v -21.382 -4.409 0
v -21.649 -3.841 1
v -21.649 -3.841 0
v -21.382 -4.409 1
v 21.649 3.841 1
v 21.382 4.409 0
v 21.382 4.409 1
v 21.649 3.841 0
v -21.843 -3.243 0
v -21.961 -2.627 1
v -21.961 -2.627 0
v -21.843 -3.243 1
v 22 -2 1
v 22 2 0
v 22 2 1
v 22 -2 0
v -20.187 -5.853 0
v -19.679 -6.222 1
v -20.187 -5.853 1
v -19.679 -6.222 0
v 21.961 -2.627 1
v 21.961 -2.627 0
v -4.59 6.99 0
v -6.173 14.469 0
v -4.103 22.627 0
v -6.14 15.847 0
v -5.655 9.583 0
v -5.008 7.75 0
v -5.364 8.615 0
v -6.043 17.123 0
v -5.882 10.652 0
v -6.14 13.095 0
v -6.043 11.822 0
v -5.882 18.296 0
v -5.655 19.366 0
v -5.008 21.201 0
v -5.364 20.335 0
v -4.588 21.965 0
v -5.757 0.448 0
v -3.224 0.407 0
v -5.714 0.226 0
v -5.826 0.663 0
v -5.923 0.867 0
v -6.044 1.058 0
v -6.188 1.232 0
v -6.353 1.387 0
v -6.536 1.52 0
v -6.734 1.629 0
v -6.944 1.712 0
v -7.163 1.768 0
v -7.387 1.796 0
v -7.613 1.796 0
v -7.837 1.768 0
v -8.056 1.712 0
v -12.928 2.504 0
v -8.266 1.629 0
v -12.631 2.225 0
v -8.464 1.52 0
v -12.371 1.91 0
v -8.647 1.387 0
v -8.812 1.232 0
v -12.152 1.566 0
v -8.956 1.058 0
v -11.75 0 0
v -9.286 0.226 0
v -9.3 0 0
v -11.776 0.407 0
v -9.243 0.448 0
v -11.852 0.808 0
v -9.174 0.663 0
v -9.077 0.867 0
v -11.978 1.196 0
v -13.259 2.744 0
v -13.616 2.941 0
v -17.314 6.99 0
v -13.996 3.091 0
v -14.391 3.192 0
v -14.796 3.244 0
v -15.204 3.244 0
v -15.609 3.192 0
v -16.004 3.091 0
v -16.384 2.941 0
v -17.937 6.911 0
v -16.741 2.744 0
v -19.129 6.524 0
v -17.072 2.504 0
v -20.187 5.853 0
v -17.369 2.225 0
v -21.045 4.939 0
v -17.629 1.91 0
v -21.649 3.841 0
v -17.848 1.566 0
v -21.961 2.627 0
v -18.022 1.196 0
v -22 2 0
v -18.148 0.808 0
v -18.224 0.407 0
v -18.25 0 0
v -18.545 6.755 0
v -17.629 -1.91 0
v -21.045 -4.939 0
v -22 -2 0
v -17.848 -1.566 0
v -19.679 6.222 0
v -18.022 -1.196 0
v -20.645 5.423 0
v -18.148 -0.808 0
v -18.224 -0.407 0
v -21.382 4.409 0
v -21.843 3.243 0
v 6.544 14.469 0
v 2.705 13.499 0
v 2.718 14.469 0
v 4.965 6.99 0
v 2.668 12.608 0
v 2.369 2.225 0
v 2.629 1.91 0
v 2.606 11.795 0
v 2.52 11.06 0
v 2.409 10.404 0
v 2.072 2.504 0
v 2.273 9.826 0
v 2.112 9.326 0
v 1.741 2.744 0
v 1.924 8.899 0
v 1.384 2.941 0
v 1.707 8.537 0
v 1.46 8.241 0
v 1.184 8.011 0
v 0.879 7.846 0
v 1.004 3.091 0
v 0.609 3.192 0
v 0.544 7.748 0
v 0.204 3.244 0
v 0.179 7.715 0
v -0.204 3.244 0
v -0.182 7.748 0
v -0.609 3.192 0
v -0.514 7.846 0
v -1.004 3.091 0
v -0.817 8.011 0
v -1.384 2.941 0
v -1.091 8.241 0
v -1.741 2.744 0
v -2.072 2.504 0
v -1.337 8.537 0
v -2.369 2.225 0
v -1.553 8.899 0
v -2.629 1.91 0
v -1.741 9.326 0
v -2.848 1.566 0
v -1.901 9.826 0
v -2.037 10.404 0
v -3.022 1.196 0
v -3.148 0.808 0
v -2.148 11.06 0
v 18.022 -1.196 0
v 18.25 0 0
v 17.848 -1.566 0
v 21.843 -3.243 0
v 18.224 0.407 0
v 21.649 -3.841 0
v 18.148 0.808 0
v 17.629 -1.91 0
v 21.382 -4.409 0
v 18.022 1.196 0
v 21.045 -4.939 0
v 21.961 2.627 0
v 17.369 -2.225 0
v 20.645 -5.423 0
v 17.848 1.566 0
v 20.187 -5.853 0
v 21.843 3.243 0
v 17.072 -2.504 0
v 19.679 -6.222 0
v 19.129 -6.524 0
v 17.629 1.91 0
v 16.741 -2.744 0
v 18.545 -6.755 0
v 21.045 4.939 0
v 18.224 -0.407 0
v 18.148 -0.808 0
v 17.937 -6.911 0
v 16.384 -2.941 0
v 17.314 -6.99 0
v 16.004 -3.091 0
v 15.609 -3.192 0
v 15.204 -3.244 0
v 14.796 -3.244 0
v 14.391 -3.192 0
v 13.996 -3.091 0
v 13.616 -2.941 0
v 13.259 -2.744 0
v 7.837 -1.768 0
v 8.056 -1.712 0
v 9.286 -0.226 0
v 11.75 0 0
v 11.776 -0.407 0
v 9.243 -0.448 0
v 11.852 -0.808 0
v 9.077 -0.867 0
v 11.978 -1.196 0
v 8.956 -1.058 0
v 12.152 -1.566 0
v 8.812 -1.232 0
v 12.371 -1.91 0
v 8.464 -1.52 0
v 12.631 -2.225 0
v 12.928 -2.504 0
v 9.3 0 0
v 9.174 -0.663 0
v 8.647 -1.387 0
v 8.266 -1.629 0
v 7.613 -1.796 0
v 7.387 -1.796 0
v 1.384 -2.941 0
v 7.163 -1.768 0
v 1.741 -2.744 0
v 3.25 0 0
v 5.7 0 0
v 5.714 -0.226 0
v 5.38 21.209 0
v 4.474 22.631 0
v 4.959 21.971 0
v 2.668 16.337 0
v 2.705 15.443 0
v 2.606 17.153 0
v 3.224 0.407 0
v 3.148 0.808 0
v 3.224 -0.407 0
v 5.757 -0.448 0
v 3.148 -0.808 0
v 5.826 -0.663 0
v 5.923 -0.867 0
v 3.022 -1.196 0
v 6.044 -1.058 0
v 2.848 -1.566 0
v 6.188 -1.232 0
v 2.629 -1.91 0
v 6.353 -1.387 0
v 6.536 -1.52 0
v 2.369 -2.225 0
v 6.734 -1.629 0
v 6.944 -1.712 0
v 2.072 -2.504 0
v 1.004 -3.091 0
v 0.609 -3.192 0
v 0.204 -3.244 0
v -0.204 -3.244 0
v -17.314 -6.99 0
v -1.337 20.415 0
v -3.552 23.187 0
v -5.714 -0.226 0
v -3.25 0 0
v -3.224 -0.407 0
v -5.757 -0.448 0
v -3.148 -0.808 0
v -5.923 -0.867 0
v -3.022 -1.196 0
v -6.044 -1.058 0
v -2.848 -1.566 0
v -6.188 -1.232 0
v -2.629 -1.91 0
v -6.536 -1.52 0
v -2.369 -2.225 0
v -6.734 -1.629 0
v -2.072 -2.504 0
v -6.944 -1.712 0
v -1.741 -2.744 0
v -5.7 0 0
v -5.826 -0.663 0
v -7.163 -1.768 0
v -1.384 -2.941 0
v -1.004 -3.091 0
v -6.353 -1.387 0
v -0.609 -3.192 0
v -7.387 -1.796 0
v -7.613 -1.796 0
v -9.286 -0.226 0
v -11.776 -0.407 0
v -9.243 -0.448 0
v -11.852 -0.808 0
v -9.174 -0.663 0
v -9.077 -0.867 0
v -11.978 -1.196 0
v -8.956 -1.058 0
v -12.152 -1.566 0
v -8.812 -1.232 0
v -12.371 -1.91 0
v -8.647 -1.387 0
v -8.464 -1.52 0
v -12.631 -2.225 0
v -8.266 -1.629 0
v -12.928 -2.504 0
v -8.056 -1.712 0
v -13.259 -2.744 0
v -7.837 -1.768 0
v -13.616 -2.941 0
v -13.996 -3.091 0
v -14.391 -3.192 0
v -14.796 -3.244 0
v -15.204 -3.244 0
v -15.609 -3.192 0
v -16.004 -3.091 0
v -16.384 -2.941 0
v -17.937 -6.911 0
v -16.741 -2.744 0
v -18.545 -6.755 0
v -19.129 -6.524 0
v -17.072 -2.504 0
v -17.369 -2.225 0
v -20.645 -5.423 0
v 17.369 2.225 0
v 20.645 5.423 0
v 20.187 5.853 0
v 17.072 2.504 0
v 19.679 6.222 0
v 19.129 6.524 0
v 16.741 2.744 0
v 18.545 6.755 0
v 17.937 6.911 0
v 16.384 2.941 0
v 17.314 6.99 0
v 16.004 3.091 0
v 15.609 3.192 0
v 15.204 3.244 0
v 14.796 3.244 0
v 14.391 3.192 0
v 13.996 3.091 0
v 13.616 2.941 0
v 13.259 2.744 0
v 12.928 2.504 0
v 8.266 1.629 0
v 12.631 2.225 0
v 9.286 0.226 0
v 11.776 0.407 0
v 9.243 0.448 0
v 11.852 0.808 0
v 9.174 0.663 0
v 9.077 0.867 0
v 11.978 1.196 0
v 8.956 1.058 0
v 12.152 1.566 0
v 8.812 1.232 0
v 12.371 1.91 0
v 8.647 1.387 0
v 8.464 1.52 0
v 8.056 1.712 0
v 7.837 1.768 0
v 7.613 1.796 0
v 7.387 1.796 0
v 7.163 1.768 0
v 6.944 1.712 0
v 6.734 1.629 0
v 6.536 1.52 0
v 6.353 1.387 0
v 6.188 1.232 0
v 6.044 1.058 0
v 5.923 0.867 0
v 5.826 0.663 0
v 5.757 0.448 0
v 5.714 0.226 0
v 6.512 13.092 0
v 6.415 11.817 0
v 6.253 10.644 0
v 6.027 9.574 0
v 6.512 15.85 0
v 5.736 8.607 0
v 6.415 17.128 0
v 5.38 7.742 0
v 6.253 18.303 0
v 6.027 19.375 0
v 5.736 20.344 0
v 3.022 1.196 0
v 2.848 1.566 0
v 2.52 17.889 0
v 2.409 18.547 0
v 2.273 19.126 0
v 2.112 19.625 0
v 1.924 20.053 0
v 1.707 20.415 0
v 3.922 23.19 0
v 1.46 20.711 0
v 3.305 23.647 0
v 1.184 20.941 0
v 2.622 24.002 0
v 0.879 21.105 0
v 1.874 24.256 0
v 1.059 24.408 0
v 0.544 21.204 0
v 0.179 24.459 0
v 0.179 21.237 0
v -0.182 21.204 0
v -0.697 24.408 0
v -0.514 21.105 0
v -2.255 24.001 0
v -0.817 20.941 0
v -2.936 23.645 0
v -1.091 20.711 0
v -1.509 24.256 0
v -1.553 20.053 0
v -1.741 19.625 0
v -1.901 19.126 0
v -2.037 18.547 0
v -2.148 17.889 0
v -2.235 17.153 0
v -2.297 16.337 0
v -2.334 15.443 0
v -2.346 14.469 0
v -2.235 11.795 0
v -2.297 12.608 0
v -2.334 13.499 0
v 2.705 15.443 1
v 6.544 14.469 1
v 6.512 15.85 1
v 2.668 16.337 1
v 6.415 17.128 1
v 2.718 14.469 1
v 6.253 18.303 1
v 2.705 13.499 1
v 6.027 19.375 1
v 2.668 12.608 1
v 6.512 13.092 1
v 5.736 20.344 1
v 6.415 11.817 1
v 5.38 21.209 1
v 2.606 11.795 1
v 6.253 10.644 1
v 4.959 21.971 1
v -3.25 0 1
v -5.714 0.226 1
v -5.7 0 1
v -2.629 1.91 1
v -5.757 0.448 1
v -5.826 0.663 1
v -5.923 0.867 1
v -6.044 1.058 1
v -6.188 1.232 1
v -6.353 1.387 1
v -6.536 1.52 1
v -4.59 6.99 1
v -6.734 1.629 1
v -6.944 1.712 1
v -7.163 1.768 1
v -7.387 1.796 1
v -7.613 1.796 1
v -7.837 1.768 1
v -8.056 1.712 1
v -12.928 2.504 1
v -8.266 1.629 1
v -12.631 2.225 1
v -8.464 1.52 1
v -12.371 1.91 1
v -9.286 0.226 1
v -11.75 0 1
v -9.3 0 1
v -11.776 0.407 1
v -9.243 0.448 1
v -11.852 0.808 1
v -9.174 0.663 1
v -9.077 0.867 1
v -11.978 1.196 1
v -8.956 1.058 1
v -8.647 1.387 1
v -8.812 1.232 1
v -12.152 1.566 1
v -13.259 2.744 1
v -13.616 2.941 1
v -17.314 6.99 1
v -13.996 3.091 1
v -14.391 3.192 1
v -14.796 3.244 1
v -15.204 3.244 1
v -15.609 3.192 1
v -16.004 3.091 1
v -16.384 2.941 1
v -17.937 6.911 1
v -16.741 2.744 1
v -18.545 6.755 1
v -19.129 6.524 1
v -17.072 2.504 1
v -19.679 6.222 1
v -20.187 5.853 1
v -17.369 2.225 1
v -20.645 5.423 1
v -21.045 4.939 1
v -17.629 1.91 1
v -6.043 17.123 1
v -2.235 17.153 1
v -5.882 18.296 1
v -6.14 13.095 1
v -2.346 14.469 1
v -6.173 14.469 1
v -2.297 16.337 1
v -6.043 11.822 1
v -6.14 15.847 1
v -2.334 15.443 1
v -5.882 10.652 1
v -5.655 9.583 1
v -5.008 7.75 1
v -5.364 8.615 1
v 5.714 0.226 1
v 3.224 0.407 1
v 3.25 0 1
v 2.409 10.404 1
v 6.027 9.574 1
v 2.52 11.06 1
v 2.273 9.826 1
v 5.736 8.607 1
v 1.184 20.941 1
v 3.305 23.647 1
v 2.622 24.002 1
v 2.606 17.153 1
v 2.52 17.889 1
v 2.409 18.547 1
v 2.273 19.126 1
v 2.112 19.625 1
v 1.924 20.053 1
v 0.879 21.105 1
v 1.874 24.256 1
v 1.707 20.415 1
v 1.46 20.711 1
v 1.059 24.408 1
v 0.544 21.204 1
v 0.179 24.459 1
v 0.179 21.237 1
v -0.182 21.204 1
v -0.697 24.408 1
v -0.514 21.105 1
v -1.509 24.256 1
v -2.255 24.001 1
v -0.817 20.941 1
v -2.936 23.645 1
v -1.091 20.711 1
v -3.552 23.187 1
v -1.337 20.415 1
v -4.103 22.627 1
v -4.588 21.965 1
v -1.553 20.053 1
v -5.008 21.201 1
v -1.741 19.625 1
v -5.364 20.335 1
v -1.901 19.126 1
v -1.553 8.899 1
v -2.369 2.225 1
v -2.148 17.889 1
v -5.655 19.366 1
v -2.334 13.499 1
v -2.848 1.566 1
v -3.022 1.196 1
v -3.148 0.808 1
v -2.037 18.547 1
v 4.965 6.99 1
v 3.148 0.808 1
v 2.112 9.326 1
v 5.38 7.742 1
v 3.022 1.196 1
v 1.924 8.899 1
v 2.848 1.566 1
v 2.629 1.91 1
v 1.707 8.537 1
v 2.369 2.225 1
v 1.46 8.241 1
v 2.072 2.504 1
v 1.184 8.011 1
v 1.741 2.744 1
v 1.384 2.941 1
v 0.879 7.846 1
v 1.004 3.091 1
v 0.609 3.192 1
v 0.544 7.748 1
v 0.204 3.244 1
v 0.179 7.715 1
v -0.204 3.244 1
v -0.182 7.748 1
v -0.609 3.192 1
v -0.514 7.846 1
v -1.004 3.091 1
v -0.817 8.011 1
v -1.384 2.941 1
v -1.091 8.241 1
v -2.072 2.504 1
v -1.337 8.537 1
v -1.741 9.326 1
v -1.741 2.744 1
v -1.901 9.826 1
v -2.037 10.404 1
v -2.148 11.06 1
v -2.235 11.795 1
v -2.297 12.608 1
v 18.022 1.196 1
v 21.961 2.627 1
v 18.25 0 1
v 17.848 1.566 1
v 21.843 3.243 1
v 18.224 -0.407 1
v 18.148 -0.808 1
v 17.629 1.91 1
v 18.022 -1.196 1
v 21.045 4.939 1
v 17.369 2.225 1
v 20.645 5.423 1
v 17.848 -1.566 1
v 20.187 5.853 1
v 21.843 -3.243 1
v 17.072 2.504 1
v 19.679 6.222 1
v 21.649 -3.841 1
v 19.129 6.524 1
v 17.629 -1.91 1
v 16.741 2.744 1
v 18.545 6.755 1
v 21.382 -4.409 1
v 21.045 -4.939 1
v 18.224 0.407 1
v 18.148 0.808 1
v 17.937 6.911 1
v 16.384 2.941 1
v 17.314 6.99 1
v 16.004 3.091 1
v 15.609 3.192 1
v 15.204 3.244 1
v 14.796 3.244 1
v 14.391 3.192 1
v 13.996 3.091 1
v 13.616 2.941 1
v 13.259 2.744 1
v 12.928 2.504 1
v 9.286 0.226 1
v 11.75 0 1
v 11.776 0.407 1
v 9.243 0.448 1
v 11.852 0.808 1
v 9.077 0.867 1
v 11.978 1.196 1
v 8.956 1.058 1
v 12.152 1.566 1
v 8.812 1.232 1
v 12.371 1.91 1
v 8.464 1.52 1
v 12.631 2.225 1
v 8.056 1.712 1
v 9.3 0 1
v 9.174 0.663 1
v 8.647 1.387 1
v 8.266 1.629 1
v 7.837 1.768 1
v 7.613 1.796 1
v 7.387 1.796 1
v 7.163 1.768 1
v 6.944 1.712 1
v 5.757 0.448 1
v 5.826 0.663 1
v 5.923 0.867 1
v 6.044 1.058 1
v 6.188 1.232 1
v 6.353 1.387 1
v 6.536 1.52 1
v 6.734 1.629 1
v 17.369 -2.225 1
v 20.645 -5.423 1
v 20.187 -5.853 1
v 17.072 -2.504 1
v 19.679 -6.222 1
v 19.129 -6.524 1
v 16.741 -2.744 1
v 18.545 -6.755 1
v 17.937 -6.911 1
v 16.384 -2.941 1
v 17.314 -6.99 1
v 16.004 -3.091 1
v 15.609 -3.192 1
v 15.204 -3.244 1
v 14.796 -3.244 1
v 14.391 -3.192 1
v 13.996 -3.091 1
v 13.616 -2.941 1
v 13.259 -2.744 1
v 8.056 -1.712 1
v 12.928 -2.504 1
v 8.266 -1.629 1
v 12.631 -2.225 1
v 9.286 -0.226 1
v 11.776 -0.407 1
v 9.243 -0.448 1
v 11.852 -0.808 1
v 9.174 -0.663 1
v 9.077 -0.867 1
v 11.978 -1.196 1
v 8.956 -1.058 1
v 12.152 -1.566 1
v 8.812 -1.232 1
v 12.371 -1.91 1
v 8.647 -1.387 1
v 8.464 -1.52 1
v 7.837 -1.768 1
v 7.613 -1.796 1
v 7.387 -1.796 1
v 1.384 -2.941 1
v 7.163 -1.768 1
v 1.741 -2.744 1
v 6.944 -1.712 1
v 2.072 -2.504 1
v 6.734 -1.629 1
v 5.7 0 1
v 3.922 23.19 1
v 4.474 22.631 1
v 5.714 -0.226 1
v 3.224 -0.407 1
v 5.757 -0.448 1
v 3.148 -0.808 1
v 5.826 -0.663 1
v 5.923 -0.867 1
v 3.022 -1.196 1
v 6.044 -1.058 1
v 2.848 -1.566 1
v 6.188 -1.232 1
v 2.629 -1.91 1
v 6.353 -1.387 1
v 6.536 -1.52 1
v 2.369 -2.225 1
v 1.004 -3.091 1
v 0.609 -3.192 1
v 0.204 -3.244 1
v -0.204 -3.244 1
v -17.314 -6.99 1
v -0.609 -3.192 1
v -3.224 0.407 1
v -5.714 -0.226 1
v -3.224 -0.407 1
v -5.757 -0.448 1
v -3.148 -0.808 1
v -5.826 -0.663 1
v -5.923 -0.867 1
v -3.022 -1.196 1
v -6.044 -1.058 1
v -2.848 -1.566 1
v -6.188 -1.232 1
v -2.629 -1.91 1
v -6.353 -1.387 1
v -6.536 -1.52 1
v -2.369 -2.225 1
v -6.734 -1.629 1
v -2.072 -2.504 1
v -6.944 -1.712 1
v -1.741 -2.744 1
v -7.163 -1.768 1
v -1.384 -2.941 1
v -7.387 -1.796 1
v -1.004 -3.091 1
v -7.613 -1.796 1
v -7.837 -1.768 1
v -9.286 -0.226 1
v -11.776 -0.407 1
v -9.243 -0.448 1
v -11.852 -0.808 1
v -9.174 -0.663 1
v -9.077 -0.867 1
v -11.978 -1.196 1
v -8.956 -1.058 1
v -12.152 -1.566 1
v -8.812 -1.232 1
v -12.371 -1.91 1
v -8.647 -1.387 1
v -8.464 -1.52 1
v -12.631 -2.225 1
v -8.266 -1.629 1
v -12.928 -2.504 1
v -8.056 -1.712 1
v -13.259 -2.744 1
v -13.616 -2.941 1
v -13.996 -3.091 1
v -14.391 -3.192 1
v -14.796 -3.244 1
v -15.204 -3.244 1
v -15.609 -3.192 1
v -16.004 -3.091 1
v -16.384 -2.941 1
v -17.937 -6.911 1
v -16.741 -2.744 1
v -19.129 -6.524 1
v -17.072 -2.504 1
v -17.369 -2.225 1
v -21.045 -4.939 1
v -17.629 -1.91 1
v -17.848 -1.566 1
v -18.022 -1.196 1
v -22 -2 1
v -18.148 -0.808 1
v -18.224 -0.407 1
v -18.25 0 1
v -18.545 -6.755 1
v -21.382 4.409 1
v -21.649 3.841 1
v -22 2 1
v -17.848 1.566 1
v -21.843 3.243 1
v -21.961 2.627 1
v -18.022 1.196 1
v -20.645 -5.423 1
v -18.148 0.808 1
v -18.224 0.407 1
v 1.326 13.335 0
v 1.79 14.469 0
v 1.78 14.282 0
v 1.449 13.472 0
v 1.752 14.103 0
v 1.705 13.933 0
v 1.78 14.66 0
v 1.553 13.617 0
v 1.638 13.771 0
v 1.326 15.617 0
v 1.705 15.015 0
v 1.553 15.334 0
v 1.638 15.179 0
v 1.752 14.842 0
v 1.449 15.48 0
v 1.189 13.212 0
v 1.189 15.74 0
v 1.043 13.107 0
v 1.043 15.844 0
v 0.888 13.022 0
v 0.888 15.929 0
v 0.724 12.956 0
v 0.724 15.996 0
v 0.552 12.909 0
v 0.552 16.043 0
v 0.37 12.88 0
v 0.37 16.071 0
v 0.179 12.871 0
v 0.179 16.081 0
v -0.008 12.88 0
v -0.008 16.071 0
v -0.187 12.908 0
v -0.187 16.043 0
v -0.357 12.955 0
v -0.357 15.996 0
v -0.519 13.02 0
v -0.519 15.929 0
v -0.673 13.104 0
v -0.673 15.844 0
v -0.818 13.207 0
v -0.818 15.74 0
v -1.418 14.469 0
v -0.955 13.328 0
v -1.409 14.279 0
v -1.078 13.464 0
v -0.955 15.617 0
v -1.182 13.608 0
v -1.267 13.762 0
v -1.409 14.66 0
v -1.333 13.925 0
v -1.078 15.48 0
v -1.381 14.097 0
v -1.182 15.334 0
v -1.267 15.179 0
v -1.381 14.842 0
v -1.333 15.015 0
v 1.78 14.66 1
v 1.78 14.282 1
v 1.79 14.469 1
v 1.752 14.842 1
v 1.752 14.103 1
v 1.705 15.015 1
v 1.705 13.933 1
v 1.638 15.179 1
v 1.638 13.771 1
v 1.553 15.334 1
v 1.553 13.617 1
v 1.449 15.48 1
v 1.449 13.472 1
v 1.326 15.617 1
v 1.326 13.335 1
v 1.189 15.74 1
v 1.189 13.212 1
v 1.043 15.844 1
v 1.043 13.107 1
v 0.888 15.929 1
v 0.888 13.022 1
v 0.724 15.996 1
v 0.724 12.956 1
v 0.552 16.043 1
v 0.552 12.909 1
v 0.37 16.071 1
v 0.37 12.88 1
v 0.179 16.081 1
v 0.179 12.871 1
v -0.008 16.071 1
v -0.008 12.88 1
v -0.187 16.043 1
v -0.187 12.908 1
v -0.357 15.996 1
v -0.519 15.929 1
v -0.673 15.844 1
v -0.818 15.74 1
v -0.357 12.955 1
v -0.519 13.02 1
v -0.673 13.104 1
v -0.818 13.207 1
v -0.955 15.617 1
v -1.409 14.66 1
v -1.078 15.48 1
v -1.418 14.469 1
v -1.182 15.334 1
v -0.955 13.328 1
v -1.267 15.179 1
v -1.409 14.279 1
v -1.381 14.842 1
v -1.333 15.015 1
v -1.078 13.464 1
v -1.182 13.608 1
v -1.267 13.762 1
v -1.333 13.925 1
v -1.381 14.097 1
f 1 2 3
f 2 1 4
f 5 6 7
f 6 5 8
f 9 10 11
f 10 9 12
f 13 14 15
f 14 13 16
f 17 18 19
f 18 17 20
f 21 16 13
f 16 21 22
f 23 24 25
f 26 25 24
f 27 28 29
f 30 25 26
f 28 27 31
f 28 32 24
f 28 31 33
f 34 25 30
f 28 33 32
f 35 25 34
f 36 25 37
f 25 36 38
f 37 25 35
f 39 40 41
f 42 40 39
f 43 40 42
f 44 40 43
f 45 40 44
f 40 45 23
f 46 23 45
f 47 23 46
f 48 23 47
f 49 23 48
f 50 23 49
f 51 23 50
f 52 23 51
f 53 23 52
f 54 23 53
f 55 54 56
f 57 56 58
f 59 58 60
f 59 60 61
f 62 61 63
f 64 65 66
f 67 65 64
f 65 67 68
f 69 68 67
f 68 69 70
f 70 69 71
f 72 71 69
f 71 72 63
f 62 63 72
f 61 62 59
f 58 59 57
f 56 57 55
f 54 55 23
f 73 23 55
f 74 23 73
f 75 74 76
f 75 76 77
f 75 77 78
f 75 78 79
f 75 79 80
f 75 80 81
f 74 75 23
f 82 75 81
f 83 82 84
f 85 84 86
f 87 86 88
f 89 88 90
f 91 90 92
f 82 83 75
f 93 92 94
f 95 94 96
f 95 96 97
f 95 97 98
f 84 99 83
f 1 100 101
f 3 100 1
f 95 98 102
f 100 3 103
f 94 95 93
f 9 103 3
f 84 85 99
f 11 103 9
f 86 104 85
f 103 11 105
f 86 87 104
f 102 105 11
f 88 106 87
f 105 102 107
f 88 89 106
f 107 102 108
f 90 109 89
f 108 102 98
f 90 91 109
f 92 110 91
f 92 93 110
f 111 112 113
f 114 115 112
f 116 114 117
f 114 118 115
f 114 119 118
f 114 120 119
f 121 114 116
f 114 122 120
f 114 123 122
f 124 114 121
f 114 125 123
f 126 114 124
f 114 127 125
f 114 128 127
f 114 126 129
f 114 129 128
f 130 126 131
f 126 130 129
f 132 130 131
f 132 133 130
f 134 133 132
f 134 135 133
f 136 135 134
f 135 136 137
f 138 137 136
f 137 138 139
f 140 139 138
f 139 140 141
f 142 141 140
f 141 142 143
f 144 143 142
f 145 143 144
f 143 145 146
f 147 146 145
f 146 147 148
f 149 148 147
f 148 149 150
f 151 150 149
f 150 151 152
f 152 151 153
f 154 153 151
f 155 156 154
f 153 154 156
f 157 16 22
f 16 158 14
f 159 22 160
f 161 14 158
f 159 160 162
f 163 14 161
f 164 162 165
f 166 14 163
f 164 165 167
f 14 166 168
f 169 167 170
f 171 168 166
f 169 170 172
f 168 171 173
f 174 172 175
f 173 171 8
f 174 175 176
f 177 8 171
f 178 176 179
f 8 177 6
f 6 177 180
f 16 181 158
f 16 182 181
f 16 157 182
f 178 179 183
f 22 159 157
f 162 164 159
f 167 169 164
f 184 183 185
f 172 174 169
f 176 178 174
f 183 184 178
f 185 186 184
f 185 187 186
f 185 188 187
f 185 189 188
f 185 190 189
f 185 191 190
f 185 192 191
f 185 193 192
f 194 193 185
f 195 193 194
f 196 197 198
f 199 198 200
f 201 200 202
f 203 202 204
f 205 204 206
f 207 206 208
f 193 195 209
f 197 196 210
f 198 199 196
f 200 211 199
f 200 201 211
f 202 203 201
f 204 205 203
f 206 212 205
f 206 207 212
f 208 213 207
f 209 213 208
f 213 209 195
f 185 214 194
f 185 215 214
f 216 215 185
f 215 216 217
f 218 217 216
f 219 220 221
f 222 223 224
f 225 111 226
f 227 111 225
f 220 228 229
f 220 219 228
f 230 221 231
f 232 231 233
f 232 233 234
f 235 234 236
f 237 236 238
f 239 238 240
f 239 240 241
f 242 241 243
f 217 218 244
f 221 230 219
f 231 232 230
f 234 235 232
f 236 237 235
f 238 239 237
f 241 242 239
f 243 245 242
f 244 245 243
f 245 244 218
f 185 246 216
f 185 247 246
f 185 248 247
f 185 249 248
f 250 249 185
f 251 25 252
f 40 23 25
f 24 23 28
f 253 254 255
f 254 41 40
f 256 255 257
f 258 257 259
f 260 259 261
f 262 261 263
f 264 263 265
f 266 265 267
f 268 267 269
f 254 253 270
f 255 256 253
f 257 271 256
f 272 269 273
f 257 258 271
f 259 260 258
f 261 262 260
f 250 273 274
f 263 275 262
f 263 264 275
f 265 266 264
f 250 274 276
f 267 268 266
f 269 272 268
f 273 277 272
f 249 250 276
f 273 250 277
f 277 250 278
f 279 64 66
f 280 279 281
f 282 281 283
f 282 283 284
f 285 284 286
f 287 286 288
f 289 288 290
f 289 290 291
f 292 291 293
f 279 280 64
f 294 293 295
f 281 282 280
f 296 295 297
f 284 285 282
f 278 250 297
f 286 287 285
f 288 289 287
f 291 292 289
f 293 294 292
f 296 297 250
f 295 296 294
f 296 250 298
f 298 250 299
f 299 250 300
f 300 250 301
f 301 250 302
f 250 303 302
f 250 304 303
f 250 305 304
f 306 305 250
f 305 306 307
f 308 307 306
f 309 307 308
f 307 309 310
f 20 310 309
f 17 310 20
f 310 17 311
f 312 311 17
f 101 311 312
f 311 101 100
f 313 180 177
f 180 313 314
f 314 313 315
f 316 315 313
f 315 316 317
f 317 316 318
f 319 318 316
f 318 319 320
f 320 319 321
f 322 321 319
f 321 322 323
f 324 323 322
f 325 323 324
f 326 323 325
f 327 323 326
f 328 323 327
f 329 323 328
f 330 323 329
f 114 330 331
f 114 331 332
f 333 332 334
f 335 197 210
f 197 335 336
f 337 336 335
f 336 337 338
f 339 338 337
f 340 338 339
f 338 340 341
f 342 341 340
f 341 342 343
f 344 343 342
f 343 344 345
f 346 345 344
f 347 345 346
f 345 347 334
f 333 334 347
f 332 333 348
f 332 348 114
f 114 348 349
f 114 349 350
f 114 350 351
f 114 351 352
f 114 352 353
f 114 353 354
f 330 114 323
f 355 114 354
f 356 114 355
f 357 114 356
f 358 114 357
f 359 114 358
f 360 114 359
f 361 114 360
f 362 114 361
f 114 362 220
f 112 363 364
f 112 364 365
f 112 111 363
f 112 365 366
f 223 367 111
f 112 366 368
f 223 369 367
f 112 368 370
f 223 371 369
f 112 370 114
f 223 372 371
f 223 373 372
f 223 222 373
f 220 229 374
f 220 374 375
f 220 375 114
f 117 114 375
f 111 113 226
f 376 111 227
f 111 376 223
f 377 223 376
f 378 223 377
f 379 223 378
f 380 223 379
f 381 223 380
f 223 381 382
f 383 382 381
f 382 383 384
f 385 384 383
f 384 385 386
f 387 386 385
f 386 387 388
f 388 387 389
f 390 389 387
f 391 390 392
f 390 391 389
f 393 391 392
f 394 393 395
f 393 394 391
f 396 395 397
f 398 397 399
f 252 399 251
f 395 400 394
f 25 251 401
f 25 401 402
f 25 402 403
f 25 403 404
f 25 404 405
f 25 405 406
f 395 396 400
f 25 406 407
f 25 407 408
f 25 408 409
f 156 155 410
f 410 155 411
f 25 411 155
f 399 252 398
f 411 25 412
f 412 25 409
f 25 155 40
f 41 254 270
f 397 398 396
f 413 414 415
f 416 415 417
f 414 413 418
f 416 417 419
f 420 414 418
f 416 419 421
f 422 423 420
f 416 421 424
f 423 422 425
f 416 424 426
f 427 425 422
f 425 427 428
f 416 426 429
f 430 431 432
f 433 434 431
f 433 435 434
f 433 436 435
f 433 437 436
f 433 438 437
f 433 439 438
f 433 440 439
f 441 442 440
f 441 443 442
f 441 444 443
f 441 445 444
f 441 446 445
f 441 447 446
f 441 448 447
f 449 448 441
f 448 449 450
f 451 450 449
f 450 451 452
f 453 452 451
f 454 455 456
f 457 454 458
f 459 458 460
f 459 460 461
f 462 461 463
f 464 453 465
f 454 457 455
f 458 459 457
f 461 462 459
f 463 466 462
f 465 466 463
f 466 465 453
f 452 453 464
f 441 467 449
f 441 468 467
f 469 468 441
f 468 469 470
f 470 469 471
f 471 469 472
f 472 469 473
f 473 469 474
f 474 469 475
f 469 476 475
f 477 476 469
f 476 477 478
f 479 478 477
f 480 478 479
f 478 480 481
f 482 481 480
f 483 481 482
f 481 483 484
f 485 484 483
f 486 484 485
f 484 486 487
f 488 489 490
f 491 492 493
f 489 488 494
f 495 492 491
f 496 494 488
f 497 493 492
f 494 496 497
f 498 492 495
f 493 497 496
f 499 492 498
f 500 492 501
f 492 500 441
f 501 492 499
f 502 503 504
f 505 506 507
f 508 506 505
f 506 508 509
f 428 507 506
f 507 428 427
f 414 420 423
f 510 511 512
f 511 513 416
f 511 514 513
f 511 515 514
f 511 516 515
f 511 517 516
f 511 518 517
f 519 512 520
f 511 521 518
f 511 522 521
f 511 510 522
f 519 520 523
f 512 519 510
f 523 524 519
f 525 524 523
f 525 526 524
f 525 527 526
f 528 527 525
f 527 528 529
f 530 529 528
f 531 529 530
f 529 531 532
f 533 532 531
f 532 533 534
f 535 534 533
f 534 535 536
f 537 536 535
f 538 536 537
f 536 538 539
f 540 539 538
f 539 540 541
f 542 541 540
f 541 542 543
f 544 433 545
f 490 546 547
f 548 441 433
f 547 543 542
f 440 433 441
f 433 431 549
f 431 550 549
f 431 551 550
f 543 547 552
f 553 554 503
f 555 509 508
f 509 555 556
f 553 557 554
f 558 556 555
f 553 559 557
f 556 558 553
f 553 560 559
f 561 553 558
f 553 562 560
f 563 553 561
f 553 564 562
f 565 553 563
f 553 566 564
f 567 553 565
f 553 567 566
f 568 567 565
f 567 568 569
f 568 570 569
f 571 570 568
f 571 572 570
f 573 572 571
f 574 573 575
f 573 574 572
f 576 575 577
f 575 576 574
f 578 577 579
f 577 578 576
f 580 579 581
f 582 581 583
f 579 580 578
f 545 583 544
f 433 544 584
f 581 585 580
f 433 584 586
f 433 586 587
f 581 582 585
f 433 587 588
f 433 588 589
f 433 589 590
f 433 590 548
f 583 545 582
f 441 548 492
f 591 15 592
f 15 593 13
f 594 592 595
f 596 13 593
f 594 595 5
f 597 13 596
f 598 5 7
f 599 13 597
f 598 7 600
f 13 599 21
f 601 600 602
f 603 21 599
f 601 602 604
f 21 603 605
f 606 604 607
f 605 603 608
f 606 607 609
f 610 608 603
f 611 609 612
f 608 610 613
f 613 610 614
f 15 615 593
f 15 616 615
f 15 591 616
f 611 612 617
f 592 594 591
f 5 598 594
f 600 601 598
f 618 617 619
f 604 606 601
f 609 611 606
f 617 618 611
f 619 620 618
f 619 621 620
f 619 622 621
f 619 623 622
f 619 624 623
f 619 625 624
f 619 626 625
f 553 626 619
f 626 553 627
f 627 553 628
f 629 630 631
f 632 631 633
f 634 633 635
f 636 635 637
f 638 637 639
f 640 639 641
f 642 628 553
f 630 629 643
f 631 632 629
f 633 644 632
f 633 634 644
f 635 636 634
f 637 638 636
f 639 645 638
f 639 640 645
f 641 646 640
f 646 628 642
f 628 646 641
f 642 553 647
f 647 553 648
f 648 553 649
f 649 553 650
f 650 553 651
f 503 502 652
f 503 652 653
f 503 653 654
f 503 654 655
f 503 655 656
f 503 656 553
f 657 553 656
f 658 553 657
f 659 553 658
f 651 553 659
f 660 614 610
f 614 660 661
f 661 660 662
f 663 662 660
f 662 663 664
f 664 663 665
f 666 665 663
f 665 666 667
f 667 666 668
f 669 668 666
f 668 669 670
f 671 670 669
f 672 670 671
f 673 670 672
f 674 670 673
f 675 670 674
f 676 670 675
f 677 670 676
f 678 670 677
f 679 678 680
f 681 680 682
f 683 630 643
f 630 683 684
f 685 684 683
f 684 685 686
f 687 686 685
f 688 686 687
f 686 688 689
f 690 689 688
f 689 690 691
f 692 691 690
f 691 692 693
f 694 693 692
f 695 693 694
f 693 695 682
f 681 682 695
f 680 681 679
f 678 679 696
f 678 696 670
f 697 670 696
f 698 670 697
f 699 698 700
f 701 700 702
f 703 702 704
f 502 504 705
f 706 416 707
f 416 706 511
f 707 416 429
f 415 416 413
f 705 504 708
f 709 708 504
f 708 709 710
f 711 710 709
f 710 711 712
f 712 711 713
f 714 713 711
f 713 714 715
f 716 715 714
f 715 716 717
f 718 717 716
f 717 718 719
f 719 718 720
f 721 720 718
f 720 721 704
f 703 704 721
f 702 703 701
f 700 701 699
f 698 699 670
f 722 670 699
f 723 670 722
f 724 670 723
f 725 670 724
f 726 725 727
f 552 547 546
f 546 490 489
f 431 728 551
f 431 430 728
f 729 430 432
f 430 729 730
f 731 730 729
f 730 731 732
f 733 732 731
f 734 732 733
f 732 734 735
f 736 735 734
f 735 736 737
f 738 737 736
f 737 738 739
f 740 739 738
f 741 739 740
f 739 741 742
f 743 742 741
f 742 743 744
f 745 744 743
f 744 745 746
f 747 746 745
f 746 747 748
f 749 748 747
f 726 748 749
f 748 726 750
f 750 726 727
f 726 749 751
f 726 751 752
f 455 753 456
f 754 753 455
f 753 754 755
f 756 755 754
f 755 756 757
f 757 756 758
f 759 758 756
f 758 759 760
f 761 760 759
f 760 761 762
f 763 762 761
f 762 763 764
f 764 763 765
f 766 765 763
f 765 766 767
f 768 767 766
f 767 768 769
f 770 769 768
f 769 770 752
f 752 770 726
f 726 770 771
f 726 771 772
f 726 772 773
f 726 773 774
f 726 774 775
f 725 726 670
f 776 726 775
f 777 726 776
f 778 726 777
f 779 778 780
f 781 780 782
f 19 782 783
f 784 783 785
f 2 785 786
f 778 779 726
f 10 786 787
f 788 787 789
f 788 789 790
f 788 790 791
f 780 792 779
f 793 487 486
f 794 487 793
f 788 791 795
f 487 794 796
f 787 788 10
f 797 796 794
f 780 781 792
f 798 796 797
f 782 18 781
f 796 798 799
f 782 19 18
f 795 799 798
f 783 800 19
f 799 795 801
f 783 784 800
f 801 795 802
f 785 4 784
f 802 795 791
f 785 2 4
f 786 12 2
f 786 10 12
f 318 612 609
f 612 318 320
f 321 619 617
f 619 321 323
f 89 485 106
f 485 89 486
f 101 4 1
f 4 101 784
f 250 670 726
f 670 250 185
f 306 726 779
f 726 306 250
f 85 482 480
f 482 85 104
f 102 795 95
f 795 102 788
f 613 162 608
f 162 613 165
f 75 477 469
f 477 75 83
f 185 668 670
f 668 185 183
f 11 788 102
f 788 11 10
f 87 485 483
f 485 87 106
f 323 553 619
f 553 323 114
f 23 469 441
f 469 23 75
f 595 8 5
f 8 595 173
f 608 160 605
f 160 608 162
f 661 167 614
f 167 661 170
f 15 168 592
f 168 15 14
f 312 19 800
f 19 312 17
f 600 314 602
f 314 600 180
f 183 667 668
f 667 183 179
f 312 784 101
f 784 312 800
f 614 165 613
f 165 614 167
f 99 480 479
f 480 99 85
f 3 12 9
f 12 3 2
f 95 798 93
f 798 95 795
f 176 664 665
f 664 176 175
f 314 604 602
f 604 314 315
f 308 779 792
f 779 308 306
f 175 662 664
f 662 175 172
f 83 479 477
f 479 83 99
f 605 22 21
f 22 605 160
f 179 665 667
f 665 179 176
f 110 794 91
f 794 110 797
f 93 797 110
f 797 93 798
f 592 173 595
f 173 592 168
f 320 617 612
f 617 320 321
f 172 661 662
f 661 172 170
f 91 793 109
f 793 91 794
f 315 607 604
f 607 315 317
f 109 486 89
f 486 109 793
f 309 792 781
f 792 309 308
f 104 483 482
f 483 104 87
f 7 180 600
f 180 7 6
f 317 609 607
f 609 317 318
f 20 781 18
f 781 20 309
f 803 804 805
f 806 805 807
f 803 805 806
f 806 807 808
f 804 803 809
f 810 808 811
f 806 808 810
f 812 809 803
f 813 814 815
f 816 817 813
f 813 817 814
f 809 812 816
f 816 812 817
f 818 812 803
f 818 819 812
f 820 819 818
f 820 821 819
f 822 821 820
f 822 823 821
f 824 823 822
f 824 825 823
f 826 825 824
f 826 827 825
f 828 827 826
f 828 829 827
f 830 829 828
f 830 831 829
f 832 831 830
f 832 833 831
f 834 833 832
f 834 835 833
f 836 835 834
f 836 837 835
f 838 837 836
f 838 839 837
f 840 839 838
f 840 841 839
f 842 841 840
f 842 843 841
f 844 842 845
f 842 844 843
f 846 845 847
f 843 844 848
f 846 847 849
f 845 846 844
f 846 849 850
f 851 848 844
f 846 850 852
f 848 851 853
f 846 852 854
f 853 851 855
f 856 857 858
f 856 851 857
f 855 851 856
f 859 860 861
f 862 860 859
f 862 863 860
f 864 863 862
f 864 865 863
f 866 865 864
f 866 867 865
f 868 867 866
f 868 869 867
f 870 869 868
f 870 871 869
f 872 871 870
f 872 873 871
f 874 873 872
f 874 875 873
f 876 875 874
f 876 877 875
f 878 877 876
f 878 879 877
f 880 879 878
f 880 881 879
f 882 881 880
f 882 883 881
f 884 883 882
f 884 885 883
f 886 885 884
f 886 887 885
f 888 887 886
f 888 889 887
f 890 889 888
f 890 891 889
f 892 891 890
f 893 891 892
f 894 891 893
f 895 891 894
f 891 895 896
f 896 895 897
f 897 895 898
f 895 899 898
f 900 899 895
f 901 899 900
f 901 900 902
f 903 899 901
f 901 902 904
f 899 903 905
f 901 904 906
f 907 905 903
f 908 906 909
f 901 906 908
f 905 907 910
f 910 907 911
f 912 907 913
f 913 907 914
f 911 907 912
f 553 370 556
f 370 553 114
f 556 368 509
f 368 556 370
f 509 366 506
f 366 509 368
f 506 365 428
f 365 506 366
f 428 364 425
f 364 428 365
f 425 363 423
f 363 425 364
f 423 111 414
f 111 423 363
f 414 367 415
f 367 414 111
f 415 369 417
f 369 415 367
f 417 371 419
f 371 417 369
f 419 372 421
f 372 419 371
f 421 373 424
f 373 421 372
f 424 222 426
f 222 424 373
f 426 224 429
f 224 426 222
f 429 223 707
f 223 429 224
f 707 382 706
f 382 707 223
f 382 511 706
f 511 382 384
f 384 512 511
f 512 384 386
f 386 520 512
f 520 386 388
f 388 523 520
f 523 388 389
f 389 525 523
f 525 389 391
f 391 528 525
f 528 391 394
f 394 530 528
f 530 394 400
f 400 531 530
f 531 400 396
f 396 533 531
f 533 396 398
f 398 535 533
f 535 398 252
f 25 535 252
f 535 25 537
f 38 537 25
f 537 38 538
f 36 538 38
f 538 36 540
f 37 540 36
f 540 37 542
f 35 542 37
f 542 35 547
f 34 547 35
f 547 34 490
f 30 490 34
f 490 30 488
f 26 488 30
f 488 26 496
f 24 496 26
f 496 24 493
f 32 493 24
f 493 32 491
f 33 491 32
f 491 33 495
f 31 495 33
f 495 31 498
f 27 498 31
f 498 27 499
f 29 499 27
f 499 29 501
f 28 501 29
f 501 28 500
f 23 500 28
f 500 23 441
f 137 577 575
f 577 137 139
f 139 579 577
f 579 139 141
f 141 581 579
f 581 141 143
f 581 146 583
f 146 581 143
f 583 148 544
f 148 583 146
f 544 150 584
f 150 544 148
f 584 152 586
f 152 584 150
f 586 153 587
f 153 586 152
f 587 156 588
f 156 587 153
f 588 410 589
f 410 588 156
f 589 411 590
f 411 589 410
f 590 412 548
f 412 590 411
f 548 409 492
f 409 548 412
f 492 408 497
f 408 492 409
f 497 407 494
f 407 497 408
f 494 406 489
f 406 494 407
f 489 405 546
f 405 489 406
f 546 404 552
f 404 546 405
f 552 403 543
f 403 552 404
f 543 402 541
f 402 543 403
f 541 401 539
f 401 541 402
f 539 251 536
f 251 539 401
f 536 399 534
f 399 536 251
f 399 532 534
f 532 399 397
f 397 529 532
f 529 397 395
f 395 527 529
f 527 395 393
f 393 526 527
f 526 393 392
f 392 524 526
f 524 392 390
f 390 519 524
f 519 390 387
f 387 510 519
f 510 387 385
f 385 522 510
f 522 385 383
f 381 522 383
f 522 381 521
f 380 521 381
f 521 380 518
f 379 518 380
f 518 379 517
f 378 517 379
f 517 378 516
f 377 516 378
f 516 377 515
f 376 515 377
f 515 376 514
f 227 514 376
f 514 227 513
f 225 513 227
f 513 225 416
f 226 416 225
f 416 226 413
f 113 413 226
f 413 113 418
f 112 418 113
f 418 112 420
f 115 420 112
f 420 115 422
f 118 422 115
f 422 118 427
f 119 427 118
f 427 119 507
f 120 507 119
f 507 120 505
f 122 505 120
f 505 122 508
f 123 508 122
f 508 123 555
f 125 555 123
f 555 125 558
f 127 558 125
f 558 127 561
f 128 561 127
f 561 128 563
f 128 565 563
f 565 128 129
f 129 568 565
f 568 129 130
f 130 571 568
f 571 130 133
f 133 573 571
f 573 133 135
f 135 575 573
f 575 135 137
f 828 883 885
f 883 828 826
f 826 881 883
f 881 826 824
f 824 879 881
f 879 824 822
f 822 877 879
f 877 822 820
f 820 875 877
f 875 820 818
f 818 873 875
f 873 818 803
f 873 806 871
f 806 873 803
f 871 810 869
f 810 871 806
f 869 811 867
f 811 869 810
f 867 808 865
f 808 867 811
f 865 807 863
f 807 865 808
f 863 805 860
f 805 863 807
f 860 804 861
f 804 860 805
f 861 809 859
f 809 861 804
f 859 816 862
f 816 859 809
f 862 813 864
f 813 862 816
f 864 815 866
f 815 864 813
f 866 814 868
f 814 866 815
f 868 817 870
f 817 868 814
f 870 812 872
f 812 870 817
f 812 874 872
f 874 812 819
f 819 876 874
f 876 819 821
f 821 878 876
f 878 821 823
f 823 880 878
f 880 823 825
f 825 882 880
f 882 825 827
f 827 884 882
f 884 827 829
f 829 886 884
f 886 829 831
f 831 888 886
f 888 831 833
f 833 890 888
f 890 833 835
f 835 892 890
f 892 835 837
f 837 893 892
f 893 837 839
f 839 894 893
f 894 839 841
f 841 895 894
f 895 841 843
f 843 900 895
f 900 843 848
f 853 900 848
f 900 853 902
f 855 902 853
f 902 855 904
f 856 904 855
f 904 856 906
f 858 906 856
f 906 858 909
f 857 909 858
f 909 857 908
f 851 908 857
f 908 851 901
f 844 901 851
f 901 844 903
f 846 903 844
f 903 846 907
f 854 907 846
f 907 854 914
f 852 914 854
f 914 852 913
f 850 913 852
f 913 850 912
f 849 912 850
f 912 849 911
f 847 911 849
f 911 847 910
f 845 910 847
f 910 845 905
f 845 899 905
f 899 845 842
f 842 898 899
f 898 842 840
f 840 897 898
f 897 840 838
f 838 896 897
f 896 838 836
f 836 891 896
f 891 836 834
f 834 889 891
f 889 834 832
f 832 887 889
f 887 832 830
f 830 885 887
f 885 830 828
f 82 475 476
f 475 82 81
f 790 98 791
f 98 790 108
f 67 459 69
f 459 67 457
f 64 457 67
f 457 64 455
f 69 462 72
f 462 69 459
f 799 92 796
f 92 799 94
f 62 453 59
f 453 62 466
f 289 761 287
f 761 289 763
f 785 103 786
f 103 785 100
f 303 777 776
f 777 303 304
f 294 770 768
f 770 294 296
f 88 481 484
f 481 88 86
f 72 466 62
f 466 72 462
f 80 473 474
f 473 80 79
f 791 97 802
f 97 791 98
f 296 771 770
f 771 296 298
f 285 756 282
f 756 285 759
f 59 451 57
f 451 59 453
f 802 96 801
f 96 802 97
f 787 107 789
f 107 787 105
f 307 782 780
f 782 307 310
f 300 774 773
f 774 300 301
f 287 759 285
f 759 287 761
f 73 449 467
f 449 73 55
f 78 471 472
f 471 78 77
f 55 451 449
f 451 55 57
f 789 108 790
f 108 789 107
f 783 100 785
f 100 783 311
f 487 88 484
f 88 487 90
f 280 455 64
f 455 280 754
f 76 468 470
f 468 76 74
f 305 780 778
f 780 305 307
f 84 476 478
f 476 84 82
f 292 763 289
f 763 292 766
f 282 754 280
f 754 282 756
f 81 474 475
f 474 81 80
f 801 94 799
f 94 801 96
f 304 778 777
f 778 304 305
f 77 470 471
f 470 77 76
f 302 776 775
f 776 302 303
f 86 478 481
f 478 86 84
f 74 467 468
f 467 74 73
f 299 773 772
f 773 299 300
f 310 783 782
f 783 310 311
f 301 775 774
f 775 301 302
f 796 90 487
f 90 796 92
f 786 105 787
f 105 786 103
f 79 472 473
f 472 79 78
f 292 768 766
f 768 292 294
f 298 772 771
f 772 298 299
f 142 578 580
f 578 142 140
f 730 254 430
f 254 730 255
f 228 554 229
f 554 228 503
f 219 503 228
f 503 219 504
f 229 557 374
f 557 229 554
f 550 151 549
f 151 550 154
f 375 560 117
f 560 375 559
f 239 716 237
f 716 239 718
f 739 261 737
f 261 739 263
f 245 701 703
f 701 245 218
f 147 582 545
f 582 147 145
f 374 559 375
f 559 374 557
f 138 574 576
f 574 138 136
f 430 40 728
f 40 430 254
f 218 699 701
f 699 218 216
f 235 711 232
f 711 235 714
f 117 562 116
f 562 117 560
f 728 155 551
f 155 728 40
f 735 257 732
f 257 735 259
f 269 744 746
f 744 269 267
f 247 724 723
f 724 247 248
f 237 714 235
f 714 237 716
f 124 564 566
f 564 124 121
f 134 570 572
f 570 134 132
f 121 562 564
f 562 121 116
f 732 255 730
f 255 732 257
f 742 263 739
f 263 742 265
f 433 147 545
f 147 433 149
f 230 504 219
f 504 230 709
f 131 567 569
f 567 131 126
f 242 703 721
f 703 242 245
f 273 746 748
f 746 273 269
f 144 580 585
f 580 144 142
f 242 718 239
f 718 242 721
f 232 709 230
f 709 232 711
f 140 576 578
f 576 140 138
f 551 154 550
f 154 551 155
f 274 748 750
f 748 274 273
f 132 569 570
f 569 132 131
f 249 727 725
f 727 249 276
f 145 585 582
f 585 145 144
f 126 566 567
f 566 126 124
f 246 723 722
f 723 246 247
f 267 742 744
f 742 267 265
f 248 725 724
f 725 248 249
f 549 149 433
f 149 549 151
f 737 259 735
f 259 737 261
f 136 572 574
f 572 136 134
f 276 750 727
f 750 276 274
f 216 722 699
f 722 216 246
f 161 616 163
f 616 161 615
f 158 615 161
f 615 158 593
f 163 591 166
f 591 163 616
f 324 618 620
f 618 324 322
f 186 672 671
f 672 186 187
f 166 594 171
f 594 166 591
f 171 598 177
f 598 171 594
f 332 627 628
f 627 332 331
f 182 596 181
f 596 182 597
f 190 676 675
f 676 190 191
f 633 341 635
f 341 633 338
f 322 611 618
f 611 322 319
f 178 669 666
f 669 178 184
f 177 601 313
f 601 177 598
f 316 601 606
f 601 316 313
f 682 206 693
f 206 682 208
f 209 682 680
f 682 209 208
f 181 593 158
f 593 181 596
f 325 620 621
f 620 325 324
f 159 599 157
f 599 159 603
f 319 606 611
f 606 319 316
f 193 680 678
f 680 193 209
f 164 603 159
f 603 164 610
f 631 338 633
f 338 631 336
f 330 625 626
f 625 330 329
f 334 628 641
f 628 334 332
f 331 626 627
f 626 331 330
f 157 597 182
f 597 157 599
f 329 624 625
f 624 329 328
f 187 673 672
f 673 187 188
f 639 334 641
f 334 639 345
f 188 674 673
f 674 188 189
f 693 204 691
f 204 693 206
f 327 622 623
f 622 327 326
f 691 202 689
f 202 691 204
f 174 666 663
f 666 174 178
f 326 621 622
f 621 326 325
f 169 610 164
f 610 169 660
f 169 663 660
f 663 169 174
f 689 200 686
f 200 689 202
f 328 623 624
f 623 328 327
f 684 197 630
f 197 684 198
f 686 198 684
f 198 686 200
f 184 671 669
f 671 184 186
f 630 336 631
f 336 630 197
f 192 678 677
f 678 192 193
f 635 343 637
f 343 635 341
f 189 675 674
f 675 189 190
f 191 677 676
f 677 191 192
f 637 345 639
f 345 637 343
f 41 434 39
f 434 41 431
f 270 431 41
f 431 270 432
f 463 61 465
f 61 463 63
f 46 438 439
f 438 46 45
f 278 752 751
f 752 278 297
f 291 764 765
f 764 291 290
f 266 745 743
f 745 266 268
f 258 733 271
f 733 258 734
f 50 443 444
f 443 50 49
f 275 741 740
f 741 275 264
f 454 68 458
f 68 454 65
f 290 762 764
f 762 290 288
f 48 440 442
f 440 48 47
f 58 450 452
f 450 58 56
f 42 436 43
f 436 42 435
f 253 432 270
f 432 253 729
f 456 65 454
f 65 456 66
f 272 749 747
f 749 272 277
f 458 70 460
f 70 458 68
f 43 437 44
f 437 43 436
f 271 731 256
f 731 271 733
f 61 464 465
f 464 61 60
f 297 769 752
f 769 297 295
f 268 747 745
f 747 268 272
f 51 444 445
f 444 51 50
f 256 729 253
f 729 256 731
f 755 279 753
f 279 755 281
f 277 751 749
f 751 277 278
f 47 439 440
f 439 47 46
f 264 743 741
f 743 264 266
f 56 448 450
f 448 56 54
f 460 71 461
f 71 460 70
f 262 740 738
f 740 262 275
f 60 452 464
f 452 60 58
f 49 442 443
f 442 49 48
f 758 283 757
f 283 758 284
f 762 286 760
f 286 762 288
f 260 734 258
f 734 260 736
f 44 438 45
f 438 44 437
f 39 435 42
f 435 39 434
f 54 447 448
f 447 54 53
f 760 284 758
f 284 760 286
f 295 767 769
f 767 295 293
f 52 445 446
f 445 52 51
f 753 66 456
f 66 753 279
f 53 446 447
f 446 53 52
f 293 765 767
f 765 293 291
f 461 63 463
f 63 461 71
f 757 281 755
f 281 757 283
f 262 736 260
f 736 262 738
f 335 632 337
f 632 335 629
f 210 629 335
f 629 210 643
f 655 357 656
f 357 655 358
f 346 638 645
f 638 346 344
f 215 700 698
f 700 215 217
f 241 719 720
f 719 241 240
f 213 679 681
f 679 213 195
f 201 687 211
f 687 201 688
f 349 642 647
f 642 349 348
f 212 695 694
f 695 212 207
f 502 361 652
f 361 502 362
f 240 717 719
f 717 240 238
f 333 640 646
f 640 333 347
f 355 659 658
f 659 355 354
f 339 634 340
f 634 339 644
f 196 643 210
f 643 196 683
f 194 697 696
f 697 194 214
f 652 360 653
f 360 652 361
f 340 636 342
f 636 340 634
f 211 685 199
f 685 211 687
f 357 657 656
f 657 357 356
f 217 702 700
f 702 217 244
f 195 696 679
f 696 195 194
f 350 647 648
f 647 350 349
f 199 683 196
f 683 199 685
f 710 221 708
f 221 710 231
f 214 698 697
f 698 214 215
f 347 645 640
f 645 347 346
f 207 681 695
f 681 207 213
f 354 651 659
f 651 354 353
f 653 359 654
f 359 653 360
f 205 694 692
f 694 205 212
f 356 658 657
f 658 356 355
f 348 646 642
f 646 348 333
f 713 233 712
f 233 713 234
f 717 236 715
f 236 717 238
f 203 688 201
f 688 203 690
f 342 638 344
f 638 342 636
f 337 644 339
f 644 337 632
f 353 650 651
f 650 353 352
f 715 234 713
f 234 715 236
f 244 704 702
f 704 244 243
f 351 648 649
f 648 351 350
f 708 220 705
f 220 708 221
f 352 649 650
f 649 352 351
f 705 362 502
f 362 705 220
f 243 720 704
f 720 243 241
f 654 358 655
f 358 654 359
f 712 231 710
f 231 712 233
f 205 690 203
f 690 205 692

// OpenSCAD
$fn = 50;


difference() {
	union() {
		hull() {
			translate(v = [-17.0000000000, 2.0000000000, 0]) {
				cylinder(h = 1, r = 5);
			}
			translate(v = [17.0000000000, 2.0000000000, 0]) {
				cylinder(h = 1, r = 5);
			}
			translate(v = [-17.0000000000, -2.0000000000, 0]) {
				cylinder(h = 1, r = 5);
			}
			translate(v = [17.0000000000, -2.0000000000, 0]) {
				cylinder(h = 1, r = 5);
			}
		}
		translate(v = [0, 24, 0]) {
			linear_extrude(height = 1) {
				text(font = "DejaVu Sans Mono:style=Bold", halign = "center", size = 19.0000000000, text = "0", valign = "top");
			}
		}
	}
	union() {
		translate(v = [-15.0000000000, 0.0000000000, 0]) {
			translate(v = [0, 0, -100]) {
				cylinder(h = 200, r = 3.2500000000);
			}
		}
		translate(v = [0, 0, -100]) {
			cylinder(h = 200, r = 3.2500000000);
		}
		translate(v = [15.0000000000, 0.0000000000, 0]) {
			translate(v = [0, 0, -100]) {
				cylinder(h = 200, r = 3.2500000000);
			}
		}
		translate(v = [-15.0000000000, 0.0000000000, 0]) {
			translate(v = [0, 0, -100]) {
				cylinder(h = 200, r = 1.8000000000);
			}
		}
		translate(v = [-7.5000000000, 0.0000000000, 0]) {
			translate(v = [0, 0, -100]) {
				cylinder(h = 200, r = 1.8000000000);
			}
		}
		translate(v = [0, 0, -100]) {
			cylinder(h = 200, r = 1.8000000000);
		}
		translate(v = [7.5000000000, 0.0000000000, 0]) {
			translate(v = [0, 0, -100]) {
				cylinder(h = 200, r = 1.8000000000);
			}
		}
		translate(v = [15.0000000000, 0.0000000000, 0]) {
			translate(v = [0, 0, -100]) {
				cylinder(h = 200, r = 1.8000000000);
			}
		}
	}
}
